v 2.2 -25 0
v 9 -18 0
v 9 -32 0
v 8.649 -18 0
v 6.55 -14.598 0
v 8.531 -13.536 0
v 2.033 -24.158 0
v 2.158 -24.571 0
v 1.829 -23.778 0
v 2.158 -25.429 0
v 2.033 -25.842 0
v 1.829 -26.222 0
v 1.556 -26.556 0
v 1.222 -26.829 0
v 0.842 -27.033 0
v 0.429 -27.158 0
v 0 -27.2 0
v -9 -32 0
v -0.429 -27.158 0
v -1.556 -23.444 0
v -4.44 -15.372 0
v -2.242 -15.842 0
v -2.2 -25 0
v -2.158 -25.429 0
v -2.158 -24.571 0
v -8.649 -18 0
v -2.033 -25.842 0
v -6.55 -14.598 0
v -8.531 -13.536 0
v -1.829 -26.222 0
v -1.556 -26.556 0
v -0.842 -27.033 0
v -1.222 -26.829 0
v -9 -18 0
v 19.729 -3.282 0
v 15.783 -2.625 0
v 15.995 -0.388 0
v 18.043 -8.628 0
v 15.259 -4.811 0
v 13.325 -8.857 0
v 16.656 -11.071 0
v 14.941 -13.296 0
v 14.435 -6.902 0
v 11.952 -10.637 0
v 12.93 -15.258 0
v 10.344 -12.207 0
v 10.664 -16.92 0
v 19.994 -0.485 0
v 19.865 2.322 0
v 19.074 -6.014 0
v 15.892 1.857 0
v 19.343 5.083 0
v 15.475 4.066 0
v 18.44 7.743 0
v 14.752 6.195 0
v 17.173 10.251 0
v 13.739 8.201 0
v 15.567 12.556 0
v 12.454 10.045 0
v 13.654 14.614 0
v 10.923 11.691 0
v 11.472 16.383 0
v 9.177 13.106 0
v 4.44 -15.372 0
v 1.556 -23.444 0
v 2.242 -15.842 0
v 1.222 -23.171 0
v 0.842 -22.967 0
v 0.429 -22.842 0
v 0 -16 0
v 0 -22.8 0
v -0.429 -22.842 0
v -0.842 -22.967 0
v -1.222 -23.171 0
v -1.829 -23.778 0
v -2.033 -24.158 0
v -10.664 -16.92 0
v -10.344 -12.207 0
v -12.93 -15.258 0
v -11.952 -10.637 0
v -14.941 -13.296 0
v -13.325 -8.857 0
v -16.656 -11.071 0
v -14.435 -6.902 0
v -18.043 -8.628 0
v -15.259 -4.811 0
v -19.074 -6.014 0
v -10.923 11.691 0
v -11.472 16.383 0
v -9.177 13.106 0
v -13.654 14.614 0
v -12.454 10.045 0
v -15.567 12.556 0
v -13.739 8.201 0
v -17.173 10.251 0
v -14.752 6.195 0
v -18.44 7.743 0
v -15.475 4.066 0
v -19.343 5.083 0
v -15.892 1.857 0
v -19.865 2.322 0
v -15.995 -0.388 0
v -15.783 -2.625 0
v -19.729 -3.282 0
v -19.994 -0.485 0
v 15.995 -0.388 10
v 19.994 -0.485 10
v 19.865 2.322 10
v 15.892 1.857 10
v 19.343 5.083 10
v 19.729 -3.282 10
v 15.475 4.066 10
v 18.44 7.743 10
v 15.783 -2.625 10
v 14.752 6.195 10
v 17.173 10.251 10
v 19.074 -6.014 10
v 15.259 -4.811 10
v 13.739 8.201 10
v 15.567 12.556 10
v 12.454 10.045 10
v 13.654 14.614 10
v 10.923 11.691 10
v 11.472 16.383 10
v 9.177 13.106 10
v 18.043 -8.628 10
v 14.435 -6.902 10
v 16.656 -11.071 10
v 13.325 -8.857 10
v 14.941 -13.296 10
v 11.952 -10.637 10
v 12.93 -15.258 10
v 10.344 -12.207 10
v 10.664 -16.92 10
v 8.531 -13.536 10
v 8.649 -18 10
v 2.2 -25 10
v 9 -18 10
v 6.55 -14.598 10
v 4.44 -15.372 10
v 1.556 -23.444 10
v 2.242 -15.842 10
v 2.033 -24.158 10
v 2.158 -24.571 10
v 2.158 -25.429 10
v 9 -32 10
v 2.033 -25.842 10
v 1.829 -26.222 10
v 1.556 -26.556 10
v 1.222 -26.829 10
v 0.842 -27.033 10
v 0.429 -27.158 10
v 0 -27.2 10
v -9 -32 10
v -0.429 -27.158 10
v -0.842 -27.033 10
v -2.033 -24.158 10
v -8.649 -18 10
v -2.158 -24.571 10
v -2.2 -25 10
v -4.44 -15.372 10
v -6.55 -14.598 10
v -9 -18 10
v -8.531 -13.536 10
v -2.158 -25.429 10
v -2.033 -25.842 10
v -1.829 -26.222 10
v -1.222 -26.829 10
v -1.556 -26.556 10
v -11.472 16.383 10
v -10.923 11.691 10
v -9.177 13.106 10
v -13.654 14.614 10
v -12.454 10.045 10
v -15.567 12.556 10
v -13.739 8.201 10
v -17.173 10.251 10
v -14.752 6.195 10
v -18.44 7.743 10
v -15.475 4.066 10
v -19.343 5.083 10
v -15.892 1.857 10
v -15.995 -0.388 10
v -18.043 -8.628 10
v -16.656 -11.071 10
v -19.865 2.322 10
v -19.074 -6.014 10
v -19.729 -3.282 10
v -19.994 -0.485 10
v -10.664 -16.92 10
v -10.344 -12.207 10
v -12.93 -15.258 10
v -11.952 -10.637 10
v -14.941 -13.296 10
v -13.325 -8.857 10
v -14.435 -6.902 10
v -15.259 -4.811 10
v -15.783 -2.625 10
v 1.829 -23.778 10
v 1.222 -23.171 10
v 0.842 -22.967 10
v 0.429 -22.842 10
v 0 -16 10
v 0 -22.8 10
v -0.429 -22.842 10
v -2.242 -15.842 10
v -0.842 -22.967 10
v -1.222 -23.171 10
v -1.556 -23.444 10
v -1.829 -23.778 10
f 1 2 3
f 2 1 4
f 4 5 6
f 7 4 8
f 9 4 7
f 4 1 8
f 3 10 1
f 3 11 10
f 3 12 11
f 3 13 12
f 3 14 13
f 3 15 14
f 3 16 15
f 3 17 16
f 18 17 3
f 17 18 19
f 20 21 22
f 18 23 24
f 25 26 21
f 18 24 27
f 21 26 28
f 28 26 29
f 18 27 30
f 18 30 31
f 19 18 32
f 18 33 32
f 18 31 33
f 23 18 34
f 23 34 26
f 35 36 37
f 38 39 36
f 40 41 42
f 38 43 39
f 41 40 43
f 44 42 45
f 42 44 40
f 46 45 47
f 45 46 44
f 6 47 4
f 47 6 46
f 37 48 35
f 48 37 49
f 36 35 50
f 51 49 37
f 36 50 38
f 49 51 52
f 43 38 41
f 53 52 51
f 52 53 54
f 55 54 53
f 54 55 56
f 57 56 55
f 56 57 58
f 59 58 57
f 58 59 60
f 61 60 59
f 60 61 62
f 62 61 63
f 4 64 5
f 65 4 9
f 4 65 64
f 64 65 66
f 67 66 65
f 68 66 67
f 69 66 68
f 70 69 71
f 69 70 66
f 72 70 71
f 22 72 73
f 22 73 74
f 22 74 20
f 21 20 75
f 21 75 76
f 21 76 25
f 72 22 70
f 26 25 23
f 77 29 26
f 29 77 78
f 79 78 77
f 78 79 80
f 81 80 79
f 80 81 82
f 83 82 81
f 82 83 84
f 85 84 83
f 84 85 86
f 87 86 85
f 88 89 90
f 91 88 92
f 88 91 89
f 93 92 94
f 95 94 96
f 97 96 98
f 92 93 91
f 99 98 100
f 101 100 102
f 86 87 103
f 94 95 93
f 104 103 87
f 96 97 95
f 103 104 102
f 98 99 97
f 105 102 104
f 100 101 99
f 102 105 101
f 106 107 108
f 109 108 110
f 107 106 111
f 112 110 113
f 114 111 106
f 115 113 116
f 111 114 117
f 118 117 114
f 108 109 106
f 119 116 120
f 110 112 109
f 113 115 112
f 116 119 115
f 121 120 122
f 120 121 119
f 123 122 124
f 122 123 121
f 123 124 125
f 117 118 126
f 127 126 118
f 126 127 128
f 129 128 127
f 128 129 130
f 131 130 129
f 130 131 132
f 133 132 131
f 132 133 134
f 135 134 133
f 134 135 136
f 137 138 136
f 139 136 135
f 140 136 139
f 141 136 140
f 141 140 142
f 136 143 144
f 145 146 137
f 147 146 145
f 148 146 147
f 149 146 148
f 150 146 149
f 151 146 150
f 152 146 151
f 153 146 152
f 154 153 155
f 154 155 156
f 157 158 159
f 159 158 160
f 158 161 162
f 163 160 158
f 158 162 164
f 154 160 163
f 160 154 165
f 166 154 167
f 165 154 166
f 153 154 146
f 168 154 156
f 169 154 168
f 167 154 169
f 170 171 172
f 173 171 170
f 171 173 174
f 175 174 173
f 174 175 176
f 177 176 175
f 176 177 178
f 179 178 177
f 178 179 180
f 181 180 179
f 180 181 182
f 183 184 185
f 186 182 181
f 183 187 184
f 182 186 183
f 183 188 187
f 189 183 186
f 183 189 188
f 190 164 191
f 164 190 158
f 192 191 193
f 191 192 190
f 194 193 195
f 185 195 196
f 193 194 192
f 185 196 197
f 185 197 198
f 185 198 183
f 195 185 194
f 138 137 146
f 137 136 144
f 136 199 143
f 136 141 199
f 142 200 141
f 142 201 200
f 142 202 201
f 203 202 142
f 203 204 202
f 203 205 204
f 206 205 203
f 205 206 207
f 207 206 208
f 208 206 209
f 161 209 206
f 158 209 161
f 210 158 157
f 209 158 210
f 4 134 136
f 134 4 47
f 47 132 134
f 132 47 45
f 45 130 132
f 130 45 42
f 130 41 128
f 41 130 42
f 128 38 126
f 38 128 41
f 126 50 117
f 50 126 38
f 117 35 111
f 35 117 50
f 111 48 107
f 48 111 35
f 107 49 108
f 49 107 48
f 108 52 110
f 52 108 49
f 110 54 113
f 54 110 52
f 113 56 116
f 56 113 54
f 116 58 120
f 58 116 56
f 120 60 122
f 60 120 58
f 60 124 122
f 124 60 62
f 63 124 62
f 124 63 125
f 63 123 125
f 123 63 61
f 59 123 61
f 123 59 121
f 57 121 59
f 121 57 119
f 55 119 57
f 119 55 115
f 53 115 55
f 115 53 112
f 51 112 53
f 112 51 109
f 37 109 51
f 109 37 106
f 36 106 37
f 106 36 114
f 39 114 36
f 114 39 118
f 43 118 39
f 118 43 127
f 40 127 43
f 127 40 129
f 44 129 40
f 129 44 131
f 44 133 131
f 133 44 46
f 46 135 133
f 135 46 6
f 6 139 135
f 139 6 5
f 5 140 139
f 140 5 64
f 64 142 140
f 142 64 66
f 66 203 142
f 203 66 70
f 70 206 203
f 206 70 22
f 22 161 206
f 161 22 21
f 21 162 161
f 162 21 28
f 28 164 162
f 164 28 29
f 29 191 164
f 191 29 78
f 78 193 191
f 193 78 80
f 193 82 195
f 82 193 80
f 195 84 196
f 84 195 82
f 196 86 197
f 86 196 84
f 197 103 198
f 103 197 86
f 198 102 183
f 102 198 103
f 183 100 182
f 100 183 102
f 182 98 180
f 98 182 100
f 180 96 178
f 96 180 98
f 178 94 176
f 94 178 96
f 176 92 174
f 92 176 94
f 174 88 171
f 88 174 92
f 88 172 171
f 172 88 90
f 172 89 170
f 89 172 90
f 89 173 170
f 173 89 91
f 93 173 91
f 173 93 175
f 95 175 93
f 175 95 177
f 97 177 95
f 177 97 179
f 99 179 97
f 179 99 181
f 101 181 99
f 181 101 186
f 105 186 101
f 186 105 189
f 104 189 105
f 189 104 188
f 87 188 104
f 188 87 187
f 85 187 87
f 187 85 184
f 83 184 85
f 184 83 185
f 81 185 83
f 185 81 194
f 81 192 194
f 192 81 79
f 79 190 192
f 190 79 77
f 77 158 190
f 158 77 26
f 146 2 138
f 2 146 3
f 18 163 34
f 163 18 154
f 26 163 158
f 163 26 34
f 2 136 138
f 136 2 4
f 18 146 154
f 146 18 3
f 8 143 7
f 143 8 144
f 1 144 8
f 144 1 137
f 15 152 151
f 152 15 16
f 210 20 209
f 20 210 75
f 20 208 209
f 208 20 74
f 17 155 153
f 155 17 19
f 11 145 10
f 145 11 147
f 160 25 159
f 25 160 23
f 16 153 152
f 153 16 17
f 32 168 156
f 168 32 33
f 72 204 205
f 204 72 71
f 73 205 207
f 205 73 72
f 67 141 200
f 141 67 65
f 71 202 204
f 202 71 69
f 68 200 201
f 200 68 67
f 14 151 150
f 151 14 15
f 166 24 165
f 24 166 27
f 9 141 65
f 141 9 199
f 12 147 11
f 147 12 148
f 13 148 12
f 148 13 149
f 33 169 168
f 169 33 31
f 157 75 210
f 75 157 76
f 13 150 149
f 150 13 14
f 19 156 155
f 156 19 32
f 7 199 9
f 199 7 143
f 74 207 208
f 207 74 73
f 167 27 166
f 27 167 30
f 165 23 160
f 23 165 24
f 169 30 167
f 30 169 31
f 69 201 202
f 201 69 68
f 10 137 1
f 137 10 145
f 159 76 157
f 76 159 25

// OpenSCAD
$fn = 32;

// ----------------------------------------------------------------------
// Spring clip: 40 mm outside, 4 mm band, 70 degree opening
// ----------------------------------------------------------------------

// --- parameters (mm) ---
outer_r = 20;             // clip outside radius
inner_r = 16;             // clip bore radius
band = 4;                 // band thickness
clip_w = 10;              // clip width
opening = 70;             // opening angle
tab_w = 18;               // tab width
tab_len = 12;             // tab length past the clip
tab_hole = 4.4;           // tab fixing hole

clip_profile = [[-11.472, 16.383], [-13.654, 14.614], [-15.567, 12.556], [-17.173, 10.251], [-18.44, 7.743], [-19.343, 5.083], [-19.865, 2.322], [-19.994, -0.485], [-19.729, -3.282], [-19.074, -6.014], [-18.043, -8.628], [-16.656, -11.071], [-14.941, -13.296], [-12.93, -15.258], [-10.664, -16.92], [-8.188, -18.247], [-5.55, -19.215], [-2.803, -19.803], [0, -20], [2.803, -19.803], [5.55, -19.215], [8.188, -18.247], [10.664, -16.92], [12.93, -15.258], [14.941, -13.296], [16.656, -11.071], [18.043, -8.628], [19.074, -6.014], [19.729, -3.282], [19.994, -0.485], [19.865, 2.322], [19.343, 5.083], [18.44, 7.743], [17.173, 10.251], [15.567, 12.556], [13.654, 14.614], [11.472, 16.383], [9.177, 13.106], [10.923, 11.691], [12.454, 10.045], [13.739, 8.201], [14.752, 6.195], [15.475, 4.066], [15.892, 1.857], [15.995, -0.388], [15.783, -2.625], [15.259, -4.811], [14.435, -6.902], [13.325, -8.857], [11.952, -10.637], [10.344, -12.207], [8.531, -13.536], [6.55, -14.598], [4.44, -15.372], [2.242, -15.842], [0, -16], [-2.242, -15.842], [-4.44, -15.372], [-6.55, -14.598], [-8.531, -13.536], [-10.344, -12.207], [-11.952, -10.637], [-13.325, -8.857], [-14.435, -6.902], [-15.259, -4.811], [-15.783, -2.625], [-15.995, -0.388], [-15.892, 1.857], [-15.475, 4.066], [-14.752, 6.195], [-13.739, 8.201], [-12.454, 10.045], [-10.923, 11.691], [-9.177, 13.106]];

difference() {
  union() {
    linear_extrude(height = clip_w) polygon(clip_profile);
    /* mounting tab, sunk 2 mm into the band */
    translate([-9, -32, 0]) cube([tab_w, 14, clip_w]);
  }
  translate([0, -25, -2.5]) cylinder(h = clip_w + 5, d = tab_hole);
}
